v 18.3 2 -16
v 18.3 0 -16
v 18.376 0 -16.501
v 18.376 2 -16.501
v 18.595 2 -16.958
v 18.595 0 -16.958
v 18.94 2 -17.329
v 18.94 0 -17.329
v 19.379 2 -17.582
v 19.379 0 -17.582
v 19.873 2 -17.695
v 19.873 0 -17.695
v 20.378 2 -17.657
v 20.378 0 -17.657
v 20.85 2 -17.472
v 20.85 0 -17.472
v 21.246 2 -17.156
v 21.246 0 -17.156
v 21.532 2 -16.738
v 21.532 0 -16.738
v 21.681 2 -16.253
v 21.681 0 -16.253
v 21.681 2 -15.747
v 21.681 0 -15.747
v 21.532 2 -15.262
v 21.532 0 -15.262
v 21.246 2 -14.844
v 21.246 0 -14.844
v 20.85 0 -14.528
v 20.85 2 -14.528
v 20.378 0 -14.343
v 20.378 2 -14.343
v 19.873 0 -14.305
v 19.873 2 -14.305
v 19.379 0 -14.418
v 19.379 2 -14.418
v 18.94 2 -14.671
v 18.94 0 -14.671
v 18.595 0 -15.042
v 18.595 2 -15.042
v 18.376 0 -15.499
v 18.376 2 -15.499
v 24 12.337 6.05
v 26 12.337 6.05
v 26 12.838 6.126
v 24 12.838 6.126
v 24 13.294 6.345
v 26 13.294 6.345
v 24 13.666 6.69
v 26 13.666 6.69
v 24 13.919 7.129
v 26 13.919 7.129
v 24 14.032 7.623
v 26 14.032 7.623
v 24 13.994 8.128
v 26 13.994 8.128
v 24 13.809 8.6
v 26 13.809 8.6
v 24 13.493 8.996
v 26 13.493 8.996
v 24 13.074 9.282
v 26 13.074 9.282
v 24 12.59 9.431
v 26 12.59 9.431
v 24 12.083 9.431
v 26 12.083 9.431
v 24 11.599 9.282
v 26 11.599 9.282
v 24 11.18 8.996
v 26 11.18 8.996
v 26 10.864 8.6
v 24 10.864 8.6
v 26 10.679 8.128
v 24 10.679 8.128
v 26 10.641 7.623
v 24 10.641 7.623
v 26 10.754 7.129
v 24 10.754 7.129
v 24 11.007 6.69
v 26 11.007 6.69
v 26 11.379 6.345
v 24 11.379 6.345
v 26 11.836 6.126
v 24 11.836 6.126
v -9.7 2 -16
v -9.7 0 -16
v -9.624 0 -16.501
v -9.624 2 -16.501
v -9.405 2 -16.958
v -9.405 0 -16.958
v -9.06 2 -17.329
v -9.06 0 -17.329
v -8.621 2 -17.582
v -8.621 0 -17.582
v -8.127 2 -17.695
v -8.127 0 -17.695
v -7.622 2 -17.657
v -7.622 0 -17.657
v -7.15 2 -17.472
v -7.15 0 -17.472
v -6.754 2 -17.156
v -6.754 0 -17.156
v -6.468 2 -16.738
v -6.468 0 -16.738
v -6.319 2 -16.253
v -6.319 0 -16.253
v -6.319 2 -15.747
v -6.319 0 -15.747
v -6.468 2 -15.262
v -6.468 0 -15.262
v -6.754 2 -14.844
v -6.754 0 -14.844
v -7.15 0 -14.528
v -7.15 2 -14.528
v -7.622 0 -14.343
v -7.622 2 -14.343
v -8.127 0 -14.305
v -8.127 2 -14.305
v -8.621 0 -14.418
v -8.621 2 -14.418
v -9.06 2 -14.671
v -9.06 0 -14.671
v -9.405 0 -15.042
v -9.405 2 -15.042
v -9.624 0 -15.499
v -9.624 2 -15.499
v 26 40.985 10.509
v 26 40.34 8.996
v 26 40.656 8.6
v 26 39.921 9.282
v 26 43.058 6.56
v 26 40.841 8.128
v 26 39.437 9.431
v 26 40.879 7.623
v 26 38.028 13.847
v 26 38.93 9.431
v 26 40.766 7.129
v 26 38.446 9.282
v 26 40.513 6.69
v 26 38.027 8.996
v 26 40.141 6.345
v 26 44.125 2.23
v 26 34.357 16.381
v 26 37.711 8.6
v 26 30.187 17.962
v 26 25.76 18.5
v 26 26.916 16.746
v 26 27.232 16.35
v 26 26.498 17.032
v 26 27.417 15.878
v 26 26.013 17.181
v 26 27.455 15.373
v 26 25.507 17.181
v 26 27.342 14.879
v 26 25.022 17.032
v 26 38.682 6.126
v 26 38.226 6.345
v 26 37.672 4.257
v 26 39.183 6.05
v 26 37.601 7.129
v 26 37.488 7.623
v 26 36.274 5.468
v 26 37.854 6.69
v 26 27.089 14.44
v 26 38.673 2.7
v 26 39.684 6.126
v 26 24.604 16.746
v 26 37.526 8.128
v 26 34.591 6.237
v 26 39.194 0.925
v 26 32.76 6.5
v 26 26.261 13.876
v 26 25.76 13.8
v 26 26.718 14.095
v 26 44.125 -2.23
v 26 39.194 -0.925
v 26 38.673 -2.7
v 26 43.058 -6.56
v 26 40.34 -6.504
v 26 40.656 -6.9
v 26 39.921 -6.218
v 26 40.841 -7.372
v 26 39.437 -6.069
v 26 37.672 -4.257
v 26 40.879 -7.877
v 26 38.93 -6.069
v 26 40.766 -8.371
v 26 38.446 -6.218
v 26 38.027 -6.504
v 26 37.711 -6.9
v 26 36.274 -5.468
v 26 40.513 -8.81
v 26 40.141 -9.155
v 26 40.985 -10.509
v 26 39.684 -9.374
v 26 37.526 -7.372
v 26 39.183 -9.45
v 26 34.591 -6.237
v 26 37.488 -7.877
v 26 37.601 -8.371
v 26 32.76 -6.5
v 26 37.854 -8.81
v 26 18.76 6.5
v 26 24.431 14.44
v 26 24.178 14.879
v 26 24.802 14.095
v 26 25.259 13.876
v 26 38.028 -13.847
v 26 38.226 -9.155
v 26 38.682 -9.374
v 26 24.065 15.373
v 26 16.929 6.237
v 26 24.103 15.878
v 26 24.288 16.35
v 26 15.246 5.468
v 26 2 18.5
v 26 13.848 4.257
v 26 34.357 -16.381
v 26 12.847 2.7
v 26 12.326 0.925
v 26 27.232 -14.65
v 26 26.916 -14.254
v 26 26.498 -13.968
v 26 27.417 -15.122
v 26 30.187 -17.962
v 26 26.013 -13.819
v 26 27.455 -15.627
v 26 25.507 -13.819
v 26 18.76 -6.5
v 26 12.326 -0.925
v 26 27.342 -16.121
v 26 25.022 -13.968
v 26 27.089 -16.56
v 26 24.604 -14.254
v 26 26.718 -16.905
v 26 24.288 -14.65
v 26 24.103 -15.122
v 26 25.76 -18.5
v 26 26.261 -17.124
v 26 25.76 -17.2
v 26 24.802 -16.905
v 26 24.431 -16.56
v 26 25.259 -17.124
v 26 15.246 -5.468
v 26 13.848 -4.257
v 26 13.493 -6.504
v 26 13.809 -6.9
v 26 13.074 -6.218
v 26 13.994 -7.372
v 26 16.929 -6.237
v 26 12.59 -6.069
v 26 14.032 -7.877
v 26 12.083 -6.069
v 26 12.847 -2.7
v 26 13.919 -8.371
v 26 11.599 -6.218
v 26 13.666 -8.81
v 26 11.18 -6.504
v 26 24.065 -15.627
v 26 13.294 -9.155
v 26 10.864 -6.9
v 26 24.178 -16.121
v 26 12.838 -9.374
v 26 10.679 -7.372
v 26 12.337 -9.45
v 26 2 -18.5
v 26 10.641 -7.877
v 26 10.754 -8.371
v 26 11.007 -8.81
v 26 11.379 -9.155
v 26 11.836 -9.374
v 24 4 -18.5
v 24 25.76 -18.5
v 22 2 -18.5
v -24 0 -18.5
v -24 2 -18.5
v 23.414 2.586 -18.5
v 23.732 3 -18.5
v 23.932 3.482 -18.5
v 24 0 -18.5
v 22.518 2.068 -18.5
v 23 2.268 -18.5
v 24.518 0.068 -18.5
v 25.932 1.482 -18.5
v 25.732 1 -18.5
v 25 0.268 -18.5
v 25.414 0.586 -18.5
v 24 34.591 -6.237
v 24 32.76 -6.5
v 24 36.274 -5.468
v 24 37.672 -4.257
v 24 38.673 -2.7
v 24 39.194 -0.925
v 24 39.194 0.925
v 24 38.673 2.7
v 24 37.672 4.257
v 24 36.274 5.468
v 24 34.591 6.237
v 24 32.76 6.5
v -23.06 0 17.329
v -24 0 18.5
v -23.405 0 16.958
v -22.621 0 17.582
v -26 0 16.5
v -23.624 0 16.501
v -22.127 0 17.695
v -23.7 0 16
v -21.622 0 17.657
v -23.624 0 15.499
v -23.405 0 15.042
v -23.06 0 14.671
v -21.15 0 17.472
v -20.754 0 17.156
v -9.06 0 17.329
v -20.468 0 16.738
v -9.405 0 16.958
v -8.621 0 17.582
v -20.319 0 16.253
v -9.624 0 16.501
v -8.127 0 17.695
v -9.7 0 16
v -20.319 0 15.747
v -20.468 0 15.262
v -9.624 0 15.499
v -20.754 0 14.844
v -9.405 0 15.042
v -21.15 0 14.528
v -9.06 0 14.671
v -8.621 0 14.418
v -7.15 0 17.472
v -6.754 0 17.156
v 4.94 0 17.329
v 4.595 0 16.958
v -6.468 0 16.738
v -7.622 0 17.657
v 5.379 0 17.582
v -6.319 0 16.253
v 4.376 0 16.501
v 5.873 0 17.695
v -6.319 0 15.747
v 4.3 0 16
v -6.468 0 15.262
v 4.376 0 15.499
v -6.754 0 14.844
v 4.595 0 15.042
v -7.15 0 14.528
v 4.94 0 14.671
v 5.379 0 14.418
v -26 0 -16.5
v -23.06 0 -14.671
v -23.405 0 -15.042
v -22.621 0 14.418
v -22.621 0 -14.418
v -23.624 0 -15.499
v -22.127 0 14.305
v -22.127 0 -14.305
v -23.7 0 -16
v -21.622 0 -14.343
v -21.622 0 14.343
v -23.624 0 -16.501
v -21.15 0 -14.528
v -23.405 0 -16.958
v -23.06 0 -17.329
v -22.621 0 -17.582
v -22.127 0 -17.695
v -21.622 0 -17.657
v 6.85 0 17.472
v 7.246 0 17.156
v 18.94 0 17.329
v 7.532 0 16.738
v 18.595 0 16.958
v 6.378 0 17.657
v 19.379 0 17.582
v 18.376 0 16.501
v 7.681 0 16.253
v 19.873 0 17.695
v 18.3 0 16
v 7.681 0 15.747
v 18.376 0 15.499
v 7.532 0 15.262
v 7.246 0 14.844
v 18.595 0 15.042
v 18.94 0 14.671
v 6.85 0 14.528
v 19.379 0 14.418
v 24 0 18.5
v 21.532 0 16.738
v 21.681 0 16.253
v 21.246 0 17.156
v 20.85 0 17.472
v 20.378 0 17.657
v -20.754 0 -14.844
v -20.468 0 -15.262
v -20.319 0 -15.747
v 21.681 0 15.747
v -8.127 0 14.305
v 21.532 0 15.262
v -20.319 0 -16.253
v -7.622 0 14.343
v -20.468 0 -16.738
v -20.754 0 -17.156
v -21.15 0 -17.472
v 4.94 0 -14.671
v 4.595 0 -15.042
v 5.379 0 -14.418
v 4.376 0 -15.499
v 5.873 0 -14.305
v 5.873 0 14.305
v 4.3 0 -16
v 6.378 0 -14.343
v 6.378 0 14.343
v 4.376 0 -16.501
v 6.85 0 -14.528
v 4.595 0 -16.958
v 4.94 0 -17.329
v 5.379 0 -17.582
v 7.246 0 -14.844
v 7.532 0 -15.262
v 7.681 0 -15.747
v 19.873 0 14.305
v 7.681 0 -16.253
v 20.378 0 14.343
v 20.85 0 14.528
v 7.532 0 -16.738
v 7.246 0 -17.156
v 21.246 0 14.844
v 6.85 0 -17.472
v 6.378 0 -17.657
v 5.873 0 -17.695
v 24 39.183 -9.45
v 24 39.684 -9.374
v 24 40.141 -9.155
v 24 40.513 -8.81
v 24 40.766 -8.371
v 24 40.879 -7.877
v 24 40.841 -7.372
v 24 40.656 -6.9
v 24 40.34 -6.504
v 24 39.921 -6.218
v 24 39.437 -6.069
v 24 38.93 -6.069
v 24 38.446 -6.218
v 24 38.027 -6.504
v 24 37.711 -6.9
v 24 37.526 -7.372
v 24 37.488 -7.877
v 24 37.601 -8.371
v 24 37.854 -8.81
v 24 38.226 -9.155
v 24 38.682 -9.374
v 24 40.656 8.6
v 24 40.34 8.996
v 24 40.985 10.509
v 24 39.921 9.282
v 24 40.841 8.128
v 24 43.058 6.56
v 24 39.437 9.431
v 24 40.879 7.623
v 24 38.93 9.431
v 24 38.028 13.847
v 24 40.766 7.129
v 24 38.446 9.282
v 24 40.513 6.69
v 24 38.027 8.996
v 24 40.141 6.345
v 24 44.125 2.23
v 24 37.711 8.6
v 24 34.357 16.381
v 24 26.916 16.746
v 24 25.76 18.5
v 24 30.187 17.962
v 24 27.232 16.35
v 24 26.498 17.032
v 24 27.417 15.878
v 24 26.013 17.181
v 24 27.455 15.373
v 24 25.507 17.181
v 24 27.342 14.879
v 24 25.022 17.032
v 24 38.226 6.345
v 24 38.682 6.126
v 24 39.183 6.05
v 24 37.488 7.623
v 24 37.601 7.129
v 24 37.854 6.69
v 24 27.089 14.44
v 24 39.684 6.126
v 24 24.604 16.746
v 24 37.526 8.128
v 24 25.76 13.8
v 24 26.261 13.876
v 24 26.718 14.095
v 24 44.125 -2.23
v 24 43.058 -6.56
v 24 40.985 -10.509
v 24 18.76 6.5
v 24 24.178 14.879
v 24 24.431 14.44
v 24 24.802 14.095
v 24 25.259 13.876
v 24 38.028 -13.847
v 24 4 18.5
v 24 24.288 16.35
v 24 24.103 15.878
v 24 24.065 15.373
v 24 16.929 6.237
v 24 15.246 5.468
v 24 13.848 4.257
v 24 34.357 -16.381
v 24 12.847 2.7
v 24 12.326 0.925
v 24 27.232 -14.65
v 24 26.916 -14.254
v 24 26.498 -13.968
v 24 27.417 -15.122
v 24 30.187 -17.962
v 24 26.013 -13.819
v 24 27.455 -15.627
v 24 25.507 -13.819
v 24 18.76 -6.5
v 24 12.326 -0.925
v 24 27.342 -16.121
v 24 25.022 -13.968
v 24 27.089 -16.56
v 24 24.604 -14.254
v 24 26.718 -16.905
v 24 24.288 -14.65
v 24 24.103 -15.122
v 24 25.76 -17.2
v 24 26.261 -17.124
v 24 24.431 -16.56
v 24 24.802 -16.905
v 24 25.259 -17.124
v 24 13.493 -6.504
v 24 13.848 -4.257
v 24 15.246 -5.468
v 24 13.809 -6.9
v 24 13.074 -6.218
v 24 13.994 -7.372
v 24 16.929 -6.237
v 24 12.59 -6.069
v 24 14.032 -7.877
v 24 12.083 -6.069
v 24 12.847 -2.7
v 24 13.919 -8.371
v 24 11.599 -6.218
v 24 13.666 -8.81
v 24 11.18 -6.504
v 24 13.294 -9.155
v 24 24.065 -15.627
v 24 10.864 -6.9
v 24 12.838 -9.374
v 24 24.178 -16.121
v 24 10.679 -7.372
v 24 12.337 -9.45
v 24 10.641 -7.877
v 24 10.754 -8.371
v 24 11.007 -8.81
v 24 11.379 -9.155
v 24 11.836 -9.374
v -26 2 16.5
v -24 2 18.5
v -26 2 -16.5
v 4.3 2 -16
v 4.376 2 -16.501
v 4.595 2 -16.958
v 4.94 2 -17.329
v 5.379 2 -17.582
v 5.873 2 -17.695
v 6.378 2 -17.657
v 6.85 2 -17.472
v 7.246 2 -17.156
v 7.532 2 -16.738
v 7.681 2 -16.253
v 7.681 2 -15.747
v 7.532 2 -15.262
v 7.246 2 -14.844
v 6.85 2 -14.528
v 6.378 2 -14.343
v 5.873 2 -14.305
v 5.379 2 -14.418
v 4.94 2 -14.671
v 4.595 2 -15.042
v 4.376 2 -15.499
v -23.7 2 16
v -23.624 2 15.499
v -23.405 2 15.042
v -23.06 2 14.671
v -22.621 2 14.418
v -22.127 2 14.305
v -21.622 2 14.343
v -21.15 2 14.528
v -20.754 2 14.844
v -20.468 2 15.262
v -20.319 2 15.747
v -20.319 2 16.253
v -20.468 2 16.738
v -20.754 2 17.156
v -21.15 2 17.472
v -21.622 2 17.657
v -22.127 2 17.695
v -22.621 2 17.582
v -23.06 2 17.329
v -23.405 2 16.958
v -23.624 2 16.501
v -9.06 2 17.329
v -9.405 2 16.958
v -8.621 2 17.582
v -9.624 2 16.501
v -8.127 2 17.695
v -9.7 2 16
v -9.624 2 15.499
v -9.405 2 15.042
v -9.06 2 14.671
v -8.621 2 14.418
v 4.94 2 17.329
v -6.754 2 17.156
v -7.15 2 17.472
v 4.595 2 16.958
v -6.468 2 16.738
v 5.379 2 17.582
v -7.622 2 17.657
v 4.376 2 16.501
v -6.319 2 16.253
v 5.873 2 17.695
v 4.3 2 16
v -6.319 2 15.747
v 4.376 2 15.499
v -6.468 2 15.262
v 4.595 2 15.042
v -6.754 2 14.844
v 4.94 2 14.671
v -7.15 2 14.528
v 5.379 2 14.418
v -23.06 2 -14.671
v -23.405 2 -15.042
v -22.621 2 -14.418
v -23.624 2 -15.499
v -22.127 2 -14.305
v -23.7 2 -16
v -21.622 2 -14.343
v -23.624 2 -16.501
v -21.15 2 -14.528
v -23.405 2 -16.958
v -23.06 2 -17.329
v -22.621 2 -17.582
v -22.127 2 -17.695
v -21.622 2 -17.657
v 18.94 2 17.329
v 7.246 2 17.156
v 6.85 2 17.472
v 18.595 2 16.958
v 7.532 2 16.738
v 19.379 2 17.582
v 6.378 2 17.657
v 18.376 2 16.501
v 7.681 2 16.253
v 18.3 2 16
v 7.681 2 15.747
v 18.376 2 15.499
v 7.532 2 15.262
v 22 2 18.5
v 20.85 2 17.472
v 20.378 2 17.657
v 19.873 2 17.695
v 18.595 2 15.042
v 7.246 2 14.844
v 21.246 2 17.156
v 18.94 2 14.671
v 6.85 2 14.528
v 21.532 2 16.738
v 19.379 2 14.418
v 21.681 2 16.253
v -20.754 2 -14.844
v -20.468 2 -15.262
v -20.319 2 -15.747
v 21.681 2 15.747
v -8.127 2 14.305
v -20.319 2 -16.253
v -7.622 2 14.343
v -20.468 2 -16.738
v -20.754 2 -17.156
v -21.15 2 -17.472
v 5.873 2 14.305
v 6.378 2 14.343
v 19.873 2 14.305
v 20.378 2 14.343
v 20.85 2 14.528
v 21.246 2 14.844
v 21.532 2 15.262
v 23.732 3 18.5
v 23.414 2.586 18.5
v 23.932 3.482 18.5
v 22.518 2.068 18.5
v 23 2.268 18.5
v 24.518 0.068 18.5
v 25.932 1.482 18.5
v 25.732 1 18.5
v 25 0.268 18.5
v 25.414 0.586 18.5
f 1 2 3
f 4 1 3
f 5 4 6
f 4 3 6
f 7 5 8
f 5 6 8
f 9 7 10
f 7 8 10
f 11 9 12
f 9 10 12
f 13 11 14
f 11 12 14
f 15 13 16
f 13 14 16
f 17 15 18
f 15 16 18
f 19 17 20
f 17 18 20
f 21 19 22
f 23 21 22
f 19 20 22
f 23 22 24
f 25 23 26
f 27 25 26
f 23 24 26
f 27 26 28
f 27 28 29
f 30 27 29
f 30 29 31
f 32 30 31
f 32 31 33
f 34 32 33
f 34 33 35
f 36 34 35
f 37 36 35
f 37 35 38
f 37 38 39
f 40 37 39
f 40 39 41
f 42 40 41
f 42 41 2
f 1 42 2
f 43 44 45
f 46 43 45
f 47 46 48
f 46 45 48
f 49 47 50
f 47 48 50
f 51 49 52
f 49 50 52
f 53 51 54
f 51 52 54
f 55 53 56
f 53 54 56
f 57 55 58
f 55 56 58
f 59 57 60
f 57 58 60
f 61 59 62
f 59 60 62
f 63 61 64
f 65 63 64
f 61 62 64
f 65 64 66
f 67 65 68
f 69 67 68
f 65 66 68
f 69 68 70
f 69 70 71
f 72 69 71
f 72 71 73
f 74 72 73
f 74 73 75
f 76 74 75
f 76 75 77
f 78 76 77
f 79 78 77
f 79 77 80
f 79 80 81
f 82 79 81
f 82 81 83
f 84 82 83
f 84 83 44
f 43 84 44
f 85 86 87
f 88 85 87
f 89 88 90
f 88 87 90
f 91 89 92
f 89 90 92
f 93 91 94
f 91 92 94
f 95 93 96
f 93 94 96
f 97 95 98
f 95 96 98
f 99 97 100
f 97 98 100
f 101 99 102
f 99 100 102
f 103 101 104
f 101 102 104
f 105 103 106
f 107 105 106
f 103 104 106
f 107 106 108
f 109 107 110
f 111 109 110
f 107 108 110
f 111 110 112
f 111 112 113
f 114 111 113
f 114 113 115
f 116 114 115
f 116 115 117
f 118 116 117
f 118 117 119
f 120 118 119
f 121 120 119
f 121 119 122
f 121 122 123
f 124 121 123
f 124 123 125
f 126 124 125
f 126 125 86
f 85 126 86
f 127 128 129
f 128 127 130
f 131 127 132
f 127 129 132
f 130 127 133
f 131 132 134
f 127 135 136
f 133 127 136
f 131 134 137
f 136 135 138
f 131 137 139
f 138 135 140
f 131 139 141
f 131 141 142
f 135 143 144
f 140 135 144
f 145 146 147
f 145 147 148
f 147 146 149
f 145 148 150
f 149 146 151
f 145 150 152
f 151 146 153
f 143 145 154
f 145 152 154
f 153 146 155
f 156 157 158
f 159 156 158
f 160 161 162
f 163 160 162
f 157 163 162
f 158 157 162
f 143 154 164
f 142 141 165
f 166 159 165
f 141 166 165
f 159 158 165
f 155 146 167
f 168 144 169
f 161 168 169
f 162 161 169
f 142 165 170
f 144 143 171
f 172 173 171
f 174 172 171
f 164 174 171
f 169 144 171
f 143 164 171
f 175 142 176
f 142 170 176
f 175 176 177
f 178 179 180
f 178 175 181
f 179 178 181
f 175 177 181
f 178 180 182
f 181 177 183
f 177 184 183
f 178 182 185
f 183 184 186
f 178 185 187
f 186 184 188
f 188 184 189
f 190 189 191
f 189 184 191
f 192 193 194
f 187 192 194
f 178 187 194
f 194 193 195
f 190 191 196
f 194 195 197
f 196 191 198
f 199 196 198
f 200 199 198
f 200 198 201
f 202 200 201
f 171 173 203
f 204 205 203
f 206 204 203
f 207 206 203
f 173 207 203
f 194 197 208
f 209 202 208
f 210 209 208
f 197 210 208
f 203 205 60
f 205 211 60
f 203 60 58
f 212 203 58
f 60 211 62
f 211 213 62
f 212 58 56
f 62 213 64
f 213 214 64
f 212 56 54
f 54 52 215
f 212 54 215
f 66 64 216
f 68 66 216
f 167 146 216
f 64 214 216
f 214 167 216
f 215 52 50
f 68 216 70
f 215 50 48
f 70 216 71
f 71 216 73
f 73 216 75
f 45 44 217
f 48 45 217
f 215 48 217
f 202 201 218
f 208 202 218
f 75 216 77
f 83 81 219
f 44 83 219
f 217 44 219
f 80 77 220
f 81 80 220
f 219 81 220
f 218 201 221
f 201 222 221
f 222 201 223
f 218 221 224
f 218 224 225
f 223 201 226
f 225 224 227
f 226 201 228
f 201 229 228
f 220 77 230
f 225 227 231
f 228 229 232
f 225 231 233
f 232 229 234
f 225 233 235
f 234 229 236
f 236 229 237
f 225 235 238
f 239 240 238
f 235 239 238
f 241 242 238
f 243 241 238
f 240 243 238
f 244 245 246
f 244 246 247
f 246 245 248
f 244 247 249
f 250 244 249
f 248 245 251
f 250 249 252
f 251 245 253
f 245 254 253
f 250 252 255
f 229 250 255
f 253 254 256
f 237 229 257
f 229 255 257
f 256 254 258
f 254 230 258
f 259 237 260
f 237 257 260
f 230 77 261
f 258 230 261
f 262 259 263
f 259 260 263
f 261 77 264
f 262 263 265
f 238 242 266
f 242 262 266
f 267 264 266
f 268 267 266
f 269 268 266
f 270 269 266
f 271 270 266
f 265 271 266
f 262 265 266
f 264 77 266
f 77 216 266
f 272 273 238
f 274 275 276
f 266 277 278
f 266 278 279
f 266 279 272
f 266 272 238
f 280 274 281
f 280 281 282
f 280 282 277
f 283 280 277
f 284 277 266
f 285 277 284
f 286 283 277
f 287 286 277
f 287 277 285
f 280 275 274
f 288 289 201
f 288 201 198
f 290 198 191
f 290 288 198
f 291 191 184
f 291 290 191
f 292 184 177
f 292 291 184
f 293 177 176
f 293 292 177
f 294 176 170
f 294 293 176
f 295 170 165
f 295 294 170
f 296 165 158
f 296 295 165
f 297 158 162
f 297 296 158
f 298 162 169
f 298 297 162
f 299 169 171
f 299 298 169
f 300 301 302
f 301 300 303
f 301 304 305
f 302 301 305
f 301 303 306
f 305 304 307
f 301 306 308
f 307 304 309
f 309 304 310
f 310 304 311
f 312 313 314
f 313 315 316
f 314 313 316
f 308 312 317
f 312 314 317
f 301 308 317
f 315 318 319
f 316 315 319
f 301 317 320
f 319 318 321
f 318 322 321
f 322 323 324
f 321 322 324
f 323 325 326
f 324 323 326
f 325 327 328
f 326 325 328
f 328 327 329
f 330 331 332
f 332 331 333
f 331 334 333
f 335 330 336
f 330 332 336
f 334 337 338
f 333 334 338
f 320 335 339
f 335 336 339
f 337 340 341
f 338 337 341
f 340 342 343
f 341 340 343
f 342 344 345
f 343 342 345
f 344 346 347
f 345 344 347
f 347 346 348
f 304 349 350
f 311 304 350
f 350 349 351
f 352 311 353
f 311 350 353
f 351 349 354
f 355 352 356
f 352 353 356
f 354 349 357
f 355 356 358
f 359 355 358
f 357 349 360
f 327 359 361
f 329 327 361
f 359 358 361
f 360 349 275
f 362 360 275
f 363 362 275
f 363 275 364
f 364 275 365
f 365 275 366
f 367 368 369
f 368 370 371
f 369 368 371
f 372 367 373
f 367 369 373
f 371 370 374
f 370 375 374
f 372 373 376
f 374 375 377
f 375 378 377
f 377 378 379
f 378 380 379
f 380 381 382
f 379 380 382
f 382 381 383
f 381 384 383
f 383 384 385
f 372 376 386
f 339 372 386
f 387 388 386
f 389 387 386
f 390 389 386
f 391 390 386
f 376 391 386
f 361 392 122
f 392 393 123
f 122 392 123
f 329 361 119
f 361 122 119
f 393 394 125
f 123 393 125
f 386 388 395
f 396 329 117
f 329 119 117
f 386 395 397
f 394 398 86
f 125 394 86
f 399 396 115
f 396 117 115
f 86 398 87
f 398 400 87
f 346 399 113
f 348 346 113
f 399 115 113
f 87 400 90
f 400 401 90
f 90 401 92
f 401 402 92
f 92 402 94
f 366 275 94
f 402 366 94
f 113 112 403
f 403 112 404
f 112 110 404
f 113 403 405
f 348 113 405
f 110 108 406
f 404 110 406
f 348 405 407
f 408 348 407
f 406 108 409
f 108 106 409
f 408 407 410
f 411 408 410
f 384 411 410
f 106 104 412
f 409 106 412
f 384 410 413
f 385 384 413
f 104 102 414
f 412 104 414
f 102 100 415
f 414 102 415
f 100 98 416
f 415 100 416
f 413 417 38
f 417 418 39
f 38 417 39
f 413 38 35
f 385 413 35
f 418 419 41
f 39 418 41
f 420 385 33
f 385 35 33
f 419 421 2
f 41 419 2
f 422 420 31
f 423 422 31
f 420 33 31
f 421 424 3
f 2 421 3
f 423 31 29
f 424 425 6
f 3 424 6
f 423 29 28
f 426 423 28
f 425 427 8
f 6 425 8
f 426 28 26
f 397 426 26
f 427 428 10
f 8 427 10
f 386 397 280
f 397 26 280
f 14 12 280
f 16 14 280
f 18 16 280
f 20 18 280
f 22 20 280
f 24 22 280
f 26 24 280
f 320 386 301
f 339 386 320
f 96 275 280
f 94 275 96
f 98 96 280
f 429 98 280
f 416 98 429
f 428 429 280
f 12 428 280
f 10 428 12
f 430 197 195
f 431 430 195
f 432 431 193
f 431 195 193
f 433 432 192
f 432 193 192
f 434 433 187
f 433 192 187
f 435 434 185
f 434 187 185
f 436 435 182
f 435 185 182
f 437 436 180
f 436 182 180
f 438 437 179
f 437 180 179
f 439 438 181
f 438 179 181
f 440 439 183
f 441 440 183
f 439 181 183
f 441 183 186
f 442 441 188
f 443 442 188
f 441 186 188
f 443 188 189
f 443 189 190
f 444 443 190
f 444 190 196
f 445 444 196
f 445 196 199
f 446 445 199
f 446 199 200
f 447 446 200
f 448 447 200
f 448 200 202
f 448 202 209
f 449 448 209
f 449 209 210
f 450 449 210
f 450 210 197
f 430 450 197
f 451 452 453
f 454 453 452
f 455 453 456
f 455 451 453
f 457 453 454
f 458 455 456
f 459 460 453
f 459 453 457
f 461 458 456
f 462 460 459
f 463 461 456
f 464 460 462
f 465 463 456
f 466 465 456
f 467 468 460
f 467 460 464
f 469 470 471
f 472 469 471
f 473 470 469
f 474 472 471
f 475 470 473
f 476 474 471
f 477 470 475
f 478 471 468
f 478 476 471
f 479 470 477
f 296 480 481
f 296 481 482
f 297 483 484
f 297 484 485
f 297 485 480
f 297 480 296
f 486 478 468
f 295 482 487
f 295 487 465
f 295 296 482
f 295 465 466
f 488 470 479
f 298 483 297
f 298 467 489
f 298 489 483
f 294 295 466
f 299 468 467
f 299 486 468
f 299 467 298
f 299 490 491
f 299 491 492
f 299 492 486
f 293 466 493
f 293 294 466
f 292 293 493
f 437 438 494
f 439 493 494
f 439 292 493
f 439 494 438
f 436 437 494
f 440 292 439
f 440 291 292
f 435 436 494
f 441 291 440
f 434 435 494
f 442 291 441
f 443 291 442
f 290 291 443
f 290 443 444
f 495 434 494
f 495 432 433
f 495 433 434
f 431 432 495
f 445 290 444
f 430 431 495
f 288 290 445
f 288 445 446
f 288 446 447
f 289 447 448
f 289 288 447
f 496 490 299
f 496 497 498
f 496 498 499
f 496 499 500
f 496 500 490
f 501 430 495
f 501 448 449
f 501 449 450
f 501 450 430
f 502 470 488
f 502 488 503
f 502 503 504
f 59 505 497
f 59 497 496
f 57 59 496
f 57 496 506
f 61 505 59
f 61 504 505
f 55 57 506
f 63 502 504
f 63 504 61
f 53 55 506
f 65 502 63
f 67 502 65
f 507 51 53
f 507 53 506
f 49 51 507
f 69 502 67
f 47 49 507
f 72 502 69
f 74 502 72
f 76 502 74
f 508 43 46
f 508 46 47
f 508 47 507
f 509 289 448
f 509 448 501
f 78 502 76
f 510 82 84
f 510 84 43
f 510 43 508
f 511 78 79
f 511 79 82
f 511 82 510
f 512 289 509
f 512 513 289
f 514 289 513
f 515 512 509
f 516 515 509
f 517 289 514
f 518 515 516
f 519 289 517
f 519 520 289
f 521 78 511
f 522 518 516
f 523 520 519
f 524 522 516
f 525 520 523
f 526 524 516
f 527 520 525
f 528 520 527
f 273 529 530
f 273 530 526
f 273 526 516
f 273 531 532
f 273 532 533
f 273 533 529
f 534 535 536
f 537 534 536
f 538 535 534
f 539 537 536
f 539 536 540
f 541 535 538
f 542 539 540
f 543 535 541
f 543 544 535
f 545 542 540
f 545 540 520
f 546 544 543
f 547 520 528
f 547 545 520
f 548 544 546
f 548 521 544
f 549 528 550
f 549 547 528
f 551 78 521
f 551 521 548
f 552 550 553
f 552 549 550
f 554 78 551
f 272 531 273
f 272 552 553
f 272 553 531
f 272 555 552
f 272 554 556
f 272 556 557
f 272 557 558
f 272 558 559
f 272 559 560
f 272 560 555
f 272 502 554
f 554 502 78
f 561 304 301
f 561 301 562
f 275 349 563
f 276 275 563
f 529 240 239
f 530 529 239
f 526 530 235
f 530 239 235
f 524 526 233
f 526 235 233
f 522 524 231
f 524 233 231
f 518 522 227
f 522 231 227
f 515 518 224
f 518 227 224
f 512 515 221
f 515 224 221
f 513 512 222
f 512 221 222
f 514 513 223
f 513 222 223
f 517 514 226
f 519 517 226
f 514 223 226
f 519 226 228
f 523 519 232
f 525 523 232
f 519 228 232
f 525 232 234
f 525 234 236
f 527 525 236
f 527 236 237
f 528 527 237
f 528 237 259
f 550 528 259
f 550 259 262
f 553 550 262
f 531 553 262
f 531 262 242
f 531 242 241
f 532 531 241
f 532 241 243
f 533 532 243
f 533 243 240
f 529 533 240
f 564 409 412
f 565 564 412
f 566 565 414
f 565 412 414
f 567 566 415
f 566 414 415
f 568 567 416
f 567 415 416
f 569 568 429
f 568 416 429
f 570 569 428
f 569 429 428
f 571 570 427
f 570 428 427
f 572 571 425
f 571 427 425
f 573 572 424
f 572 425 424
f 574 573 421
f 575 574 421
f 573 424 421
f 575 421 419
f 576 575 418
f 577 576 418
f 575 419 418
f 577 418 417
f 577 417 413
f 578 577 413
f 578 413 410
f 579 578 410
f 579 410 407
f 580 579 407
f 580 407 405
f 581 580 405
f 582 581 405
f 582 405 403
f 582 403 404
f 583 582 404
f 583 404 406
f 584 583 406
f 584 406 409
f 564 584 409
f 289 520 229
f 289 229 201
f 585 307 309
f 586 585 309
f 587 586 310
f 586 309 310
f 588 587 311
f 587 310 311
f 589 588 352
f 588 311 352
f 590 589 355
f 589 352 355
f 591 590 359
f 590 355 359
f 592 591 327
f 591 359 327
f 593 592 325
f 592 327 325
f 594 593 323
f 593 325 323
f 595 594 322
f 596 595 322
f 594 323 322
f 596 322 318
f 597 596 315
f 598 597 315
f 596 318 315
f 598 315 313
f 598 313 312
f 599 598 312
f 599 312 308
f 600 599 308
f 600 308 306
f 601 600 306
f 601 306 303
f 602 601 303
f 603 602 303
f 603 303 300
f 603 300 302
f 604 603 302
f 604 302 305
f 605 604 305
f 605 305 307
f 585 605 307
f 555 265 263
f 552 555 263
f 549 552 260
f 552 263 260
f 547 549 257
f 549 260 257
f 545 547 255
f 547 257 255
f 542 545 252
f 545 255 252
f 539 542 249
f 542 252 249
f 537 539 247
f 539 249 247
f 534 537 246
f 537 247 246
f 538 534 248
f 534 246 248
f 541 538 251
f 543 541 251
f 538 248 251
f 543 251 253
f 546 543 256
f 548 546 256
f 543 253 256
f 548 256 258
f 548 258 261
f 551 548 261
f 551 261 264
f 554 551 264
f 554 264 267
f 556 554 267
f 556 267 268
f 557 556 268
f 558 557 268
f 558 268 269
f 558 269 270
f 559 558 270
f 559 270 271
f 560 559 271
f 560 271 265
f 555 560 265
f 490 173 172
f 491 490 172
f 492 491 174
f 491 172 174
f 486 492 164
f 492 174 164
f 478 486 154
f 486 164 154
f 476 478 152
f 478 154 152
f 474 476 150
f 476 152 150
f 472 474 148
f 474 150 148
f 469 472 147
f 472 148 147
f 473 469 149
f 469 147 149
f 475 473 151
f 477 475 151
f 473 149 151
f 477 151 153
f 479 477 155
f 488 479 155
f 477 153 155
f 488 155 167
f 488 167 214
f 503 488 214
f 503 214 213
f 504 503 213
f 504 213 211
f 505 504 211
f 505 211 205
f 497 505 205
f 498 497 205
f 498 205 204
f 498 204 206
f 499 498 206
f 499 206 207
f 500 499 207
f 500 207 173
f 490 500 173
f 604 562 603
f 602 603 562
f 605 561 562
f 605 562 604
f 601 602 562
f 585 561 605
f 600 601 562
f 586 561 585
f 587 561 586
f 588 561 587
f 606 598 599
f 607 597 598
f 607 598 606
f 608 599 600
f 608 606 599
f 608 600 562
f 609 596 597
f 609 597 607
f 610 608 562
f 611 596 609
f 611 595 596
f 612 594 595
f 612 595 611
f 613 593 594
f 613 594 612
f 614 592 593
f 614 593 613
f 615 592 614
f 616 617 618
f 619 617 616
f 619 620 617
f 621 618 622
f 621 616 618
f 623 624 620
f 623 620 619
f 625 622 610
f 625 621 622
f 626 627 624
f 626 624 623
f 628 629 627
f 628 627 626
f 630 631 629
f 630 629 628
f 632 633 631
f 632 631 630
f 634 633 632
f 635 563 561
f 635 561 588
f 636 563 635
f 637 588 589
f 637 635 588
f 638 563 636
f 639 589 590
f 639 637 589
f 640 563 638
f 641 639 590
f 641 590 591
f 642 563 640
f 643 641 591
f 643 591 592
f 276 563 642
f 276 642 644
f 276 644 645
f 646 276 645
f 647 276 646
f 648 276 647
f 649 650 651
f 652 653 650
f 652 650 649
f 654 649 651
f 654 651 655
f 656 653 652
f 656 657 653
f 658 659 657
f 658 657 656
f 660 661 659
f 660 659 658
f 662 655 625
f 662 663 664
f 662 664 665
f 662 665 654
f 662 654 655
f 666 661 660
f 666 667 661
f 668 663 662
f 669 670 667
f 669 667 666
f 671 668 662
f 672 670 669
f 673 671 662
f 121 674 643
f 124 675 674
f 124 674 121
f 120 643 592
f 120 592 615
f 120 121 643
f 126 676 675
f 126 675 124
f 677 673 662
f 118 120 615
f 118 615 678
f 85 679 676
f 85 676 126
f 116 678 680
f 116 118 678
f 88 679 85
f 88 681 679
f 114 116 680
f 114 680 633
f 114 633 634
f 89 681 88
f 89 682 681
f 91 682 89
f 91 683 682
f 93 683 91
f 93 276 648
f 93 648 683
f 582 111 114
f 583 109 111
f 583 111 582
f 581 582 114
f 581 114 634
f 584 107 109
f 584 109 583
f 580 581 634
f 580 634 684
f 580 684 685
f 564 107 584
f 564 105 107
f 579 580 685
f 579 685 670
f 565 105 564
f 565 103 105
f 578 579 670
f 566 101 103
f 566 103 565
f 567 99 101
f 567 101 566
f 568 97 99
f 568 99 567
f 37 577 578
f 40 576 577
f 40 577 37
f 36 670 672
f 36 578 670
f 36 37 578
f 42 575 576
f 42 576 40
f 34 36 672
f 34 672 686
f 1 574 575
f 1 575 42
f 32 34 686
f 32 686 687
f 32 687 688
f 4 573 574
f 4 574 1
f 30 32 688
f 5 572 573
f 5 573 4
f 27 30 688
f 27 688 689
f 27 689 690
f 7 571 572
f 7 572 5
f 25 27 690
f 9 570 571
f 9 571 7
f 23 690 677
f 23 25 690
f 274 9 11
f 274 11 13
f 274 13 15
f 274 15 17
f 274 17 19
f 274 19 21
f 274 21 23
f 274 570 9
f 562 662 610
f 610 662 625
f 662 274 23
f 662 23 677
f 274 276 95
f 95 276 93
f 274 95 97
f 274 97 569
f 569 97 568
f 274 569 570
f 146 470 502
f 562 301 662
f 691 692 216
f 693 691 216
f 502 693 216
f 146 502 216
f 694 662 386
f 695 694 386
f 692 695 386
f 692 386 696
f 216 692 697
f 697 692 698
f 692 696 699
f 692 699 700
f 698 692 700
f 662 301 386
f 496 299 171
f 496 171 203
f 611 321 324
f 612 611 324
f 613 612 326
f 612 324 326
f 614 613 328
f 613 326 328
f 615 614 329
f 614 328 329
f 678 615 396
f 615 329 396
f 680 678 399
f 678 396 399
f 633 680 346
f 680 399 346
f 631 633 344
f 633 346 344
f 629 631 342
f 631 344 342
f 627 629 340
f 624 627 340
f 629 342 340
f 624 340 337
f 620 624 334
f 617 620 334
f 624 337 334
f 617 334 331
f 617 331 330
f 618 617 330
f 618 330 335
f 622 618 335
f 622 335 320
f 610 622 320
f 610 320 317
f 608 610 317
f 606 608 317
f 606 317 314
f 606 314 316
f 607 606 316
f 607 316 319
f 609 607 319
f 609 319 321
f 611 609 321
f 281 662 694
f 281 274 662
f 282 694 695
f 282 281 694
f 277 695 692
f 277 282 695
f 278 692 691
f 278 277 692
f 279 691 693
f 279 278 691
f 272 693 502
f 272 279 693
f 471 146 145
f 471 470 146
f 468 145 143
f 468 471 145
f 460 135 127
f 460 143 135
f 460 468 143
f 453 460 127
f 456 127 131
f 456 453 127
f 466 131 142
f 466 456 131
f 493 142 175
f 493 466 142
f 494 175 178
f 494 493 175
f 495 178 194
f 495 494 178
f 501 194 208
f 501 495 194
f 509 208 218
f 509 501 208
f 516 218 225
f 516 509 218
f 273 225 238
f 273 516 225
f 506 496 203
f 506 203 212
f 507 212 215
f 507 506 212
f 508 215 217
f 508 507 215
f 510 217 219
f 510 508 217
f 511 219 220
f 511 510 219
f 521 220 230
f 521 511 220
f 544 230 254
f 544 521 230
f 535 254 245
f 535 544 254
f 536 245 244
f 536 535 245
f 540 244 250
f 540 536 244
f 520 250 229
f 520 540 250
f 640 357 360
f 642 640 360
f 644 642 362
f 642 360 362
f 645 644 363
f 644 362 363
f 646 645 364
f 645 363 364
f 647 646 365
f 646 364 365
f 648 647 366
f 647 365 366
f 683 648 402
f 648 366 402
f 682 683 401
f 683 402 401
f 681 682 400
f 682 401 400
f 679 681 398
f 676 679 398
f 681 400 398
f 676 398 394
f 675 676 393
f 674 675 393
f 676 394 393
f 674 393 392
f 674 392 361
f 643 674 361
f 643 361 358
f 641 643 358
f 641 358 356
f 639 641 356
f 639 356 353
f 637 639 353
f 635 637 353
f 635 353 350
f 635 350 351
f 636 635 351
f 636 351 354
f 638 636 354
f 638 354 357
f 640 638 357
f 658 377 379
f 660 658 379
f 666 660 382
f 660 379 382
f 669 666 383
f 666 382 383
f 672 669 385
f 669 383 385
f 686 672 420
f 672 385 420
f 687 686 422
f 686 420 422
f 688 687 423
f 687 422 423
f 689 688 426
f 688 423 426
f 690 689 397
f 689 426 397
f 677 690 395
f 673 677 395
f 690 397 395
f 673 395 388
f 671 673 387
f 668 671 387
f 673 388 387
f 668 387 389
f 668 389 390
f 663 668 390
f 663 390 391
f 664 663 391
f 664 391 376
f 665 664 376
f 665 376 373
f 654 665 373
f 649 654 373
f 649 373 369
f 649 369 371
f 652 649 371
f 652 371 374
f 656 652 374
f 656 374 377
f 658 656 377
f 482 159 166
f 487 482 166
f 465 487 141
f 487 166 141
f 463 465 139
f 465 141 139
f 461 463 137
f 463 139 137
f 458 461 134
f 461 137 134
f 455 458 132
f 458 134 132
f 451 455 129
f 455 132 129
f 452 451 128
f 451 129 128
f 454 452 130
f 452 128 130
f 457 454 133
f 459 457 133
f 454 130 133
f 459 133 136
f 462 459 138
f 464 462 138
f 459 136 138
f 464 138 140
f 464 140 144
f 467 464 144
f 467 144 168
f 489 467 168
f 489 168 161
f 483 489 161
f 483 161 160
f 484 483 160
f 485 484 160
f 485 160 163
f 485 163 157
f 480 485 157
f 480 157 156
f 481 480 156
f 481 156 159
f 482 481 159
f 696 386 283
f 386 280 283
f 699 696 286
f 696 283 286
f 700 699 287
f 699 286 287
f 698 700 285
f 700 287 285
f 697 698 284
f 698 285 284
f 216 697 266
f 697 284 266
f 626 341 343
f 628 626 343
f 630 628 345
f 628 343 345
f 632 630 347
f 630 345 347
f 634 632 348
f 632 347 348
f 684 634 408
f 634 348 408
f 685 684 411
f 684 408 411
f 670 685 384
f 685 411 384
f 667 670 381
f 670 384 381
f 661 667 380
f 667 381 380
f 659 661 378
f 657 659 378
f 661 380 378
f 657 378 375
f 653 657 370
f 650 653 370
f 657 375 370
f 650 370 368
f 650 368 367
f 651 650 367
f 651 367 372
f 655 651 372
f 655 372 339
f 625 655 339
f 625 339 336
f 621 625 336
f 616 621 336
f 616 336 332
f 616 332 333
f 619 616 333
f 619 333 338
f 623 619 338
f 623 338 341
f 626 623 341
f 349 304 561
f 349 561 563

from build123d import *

# Parameters (mm, degrees)
CROQUIS1_W                   = 52
CROQUIS1_H                   = 37
SALIENTE_EXTRUIR1_DEPTH      = 2
TALADRO_DE_MARGEN_PARA_M33_D = 3.4
CROQUIS9_W                   = 2
CROQUIS9_H                   = 37
SALIENTE_EXTRUIR2_DEPTH      = 42.26
CHAFL_N1_SIZE                = 2
REDONDEO1_RADIUS             = 18.5
REDONDEO1_LENGTH             = 2
TALADRO_DE_MARGEN_PARA_M34_D = 3.4
CORTAR_EXTRUIR1_DEPTH        = 70.290674697
REDONDEO3_R                  = 2
REDONDEO4_R                  = 2


with BuildPart() as part:
    # Croquis1 → Saliente-Extruir1 (new body)
    with BuildSketch(Plane(origin=(0, 0, 0), x_dir=(1, 0, 0), z_dir=(0, 1, 0))):
        Rectangle(CROQUIS1_W, CROQUIS1_H)
    extrude(amount=SALIENTE_EXTRUIR1_DEPTH)

    # Taladro de margen para M33 (through all)
    with Locations(Plane(origin=(0, 2, 0), x_dir=(1, 0, 0), z_dir=(0, 1, 0))):
        with Locations((-22, 16), (-8, 16), (6, 16), (20, 16), (-22, -16), (-8, -16), (6, -16), (20, -16)):
            Hole(TALADRO_DE_MARGEN_PARA_M33_D / 2)

    # Croquis9 → Saliente-Extruir2 (add)
    with BuildSketch(Plane(origin=(0, 2, 0), x_dir=(1, 0, 0), z_dir=(0, 1, 0))):
        with Locations((25, 0)):
            Rectangle(CROQUIS9_W, CROQUIS9_H)
    extrude(amount=SALIENTE_EXTRUIR2_DEPTH)

    # Chaflán1
    chafl_n1_edges = [part.edges().sort_by_distance(p)[0] for p in [
        (-26, 1, 18.5),
        (-26, 1, -18.5),
    ]]
    chamfer(chafl_n1_edges, length=CHAFL_N1_SIZE)

    # Redondeo1: full round fillet: the end face becomes a half cylinder, R = half its width
    redondeo1_face = Plane((25, 44.26, 0), x_dir=(-1, 0, 0), z_dir=(0, 1, 0))  # on the end face: x along it, z out of the body
    redondeo1_slab = redondeo1_face.offset(-REDONDEO1_RADIUS / 2) * Box(REDONDEO1_LENGTH, 2 * REDONDEO1_RADIUS, REDONDEO1_RADIUS, mode=Mode.PRIVATE)  # the body's end, R deep
    redondeo1_round = Plane((25, 25.76, 0), x_dir=(0, 1, 0), z_dir=(-1, 0, 0)) * Cylinder(REDONDEO1_RADIUS, REDONDEO1_LENGTH, mode=Mode.PRIVATE)  # its axis R under the face
    add(redondeo1_slab - redondeo1_round, mode=Mode.SUBTRACT)

    # Taladro de margen para M34 (through all)
    with Locations(Plane.ZY.offset(-24)):
        with Locations((-15.5, 25.76), (-7.75, 39.183393759), (7.75, 39.183393759), (15.5, 25.76), (7.75, 12.336606241), (-7.75, 12.336606241)):
            Hole(TALADRO_DE_MARGEN_PARA_M34_D / 2)

    # Croquis15 → Cortar-Extruir1 (cut, through all)
    with BuildSketch(Plane.ZY.offset(-24)):
        with BuildLine():
            Line((-6.5, 18.76), (-6.5, 32.76))
            ThreePointArc((-6.5, 32.76), (0, 39.26), (6.5, 32.76))
            Line((6.5, 32.76), (6.5, 18.76))
            ThreePointArc((6.5, 18.76), (0, 12.26), (-6.5, 18.76))
        make_face()
    extrude(amount=-CORTAR_EXTRUIR1_DEPTH, mode=Mode.SUBTRACT)

    # Redondeo3
    redondeo3_edges = [part.edges().sort_by_distance(p)[0] for p in [
        (26, 0, 0),
    ]]
    fillet(redondeo3_edges, radius=REDONDEO3_R)

    # Redondeo4
    redondeo4_edges = [part.edges().sort_by_distance(p)[0] for p in [
        (24, 2, 0),
    ]]
    fillet(redondeo4_edges, radius=REDONDEO4_R)


solid = part.part
